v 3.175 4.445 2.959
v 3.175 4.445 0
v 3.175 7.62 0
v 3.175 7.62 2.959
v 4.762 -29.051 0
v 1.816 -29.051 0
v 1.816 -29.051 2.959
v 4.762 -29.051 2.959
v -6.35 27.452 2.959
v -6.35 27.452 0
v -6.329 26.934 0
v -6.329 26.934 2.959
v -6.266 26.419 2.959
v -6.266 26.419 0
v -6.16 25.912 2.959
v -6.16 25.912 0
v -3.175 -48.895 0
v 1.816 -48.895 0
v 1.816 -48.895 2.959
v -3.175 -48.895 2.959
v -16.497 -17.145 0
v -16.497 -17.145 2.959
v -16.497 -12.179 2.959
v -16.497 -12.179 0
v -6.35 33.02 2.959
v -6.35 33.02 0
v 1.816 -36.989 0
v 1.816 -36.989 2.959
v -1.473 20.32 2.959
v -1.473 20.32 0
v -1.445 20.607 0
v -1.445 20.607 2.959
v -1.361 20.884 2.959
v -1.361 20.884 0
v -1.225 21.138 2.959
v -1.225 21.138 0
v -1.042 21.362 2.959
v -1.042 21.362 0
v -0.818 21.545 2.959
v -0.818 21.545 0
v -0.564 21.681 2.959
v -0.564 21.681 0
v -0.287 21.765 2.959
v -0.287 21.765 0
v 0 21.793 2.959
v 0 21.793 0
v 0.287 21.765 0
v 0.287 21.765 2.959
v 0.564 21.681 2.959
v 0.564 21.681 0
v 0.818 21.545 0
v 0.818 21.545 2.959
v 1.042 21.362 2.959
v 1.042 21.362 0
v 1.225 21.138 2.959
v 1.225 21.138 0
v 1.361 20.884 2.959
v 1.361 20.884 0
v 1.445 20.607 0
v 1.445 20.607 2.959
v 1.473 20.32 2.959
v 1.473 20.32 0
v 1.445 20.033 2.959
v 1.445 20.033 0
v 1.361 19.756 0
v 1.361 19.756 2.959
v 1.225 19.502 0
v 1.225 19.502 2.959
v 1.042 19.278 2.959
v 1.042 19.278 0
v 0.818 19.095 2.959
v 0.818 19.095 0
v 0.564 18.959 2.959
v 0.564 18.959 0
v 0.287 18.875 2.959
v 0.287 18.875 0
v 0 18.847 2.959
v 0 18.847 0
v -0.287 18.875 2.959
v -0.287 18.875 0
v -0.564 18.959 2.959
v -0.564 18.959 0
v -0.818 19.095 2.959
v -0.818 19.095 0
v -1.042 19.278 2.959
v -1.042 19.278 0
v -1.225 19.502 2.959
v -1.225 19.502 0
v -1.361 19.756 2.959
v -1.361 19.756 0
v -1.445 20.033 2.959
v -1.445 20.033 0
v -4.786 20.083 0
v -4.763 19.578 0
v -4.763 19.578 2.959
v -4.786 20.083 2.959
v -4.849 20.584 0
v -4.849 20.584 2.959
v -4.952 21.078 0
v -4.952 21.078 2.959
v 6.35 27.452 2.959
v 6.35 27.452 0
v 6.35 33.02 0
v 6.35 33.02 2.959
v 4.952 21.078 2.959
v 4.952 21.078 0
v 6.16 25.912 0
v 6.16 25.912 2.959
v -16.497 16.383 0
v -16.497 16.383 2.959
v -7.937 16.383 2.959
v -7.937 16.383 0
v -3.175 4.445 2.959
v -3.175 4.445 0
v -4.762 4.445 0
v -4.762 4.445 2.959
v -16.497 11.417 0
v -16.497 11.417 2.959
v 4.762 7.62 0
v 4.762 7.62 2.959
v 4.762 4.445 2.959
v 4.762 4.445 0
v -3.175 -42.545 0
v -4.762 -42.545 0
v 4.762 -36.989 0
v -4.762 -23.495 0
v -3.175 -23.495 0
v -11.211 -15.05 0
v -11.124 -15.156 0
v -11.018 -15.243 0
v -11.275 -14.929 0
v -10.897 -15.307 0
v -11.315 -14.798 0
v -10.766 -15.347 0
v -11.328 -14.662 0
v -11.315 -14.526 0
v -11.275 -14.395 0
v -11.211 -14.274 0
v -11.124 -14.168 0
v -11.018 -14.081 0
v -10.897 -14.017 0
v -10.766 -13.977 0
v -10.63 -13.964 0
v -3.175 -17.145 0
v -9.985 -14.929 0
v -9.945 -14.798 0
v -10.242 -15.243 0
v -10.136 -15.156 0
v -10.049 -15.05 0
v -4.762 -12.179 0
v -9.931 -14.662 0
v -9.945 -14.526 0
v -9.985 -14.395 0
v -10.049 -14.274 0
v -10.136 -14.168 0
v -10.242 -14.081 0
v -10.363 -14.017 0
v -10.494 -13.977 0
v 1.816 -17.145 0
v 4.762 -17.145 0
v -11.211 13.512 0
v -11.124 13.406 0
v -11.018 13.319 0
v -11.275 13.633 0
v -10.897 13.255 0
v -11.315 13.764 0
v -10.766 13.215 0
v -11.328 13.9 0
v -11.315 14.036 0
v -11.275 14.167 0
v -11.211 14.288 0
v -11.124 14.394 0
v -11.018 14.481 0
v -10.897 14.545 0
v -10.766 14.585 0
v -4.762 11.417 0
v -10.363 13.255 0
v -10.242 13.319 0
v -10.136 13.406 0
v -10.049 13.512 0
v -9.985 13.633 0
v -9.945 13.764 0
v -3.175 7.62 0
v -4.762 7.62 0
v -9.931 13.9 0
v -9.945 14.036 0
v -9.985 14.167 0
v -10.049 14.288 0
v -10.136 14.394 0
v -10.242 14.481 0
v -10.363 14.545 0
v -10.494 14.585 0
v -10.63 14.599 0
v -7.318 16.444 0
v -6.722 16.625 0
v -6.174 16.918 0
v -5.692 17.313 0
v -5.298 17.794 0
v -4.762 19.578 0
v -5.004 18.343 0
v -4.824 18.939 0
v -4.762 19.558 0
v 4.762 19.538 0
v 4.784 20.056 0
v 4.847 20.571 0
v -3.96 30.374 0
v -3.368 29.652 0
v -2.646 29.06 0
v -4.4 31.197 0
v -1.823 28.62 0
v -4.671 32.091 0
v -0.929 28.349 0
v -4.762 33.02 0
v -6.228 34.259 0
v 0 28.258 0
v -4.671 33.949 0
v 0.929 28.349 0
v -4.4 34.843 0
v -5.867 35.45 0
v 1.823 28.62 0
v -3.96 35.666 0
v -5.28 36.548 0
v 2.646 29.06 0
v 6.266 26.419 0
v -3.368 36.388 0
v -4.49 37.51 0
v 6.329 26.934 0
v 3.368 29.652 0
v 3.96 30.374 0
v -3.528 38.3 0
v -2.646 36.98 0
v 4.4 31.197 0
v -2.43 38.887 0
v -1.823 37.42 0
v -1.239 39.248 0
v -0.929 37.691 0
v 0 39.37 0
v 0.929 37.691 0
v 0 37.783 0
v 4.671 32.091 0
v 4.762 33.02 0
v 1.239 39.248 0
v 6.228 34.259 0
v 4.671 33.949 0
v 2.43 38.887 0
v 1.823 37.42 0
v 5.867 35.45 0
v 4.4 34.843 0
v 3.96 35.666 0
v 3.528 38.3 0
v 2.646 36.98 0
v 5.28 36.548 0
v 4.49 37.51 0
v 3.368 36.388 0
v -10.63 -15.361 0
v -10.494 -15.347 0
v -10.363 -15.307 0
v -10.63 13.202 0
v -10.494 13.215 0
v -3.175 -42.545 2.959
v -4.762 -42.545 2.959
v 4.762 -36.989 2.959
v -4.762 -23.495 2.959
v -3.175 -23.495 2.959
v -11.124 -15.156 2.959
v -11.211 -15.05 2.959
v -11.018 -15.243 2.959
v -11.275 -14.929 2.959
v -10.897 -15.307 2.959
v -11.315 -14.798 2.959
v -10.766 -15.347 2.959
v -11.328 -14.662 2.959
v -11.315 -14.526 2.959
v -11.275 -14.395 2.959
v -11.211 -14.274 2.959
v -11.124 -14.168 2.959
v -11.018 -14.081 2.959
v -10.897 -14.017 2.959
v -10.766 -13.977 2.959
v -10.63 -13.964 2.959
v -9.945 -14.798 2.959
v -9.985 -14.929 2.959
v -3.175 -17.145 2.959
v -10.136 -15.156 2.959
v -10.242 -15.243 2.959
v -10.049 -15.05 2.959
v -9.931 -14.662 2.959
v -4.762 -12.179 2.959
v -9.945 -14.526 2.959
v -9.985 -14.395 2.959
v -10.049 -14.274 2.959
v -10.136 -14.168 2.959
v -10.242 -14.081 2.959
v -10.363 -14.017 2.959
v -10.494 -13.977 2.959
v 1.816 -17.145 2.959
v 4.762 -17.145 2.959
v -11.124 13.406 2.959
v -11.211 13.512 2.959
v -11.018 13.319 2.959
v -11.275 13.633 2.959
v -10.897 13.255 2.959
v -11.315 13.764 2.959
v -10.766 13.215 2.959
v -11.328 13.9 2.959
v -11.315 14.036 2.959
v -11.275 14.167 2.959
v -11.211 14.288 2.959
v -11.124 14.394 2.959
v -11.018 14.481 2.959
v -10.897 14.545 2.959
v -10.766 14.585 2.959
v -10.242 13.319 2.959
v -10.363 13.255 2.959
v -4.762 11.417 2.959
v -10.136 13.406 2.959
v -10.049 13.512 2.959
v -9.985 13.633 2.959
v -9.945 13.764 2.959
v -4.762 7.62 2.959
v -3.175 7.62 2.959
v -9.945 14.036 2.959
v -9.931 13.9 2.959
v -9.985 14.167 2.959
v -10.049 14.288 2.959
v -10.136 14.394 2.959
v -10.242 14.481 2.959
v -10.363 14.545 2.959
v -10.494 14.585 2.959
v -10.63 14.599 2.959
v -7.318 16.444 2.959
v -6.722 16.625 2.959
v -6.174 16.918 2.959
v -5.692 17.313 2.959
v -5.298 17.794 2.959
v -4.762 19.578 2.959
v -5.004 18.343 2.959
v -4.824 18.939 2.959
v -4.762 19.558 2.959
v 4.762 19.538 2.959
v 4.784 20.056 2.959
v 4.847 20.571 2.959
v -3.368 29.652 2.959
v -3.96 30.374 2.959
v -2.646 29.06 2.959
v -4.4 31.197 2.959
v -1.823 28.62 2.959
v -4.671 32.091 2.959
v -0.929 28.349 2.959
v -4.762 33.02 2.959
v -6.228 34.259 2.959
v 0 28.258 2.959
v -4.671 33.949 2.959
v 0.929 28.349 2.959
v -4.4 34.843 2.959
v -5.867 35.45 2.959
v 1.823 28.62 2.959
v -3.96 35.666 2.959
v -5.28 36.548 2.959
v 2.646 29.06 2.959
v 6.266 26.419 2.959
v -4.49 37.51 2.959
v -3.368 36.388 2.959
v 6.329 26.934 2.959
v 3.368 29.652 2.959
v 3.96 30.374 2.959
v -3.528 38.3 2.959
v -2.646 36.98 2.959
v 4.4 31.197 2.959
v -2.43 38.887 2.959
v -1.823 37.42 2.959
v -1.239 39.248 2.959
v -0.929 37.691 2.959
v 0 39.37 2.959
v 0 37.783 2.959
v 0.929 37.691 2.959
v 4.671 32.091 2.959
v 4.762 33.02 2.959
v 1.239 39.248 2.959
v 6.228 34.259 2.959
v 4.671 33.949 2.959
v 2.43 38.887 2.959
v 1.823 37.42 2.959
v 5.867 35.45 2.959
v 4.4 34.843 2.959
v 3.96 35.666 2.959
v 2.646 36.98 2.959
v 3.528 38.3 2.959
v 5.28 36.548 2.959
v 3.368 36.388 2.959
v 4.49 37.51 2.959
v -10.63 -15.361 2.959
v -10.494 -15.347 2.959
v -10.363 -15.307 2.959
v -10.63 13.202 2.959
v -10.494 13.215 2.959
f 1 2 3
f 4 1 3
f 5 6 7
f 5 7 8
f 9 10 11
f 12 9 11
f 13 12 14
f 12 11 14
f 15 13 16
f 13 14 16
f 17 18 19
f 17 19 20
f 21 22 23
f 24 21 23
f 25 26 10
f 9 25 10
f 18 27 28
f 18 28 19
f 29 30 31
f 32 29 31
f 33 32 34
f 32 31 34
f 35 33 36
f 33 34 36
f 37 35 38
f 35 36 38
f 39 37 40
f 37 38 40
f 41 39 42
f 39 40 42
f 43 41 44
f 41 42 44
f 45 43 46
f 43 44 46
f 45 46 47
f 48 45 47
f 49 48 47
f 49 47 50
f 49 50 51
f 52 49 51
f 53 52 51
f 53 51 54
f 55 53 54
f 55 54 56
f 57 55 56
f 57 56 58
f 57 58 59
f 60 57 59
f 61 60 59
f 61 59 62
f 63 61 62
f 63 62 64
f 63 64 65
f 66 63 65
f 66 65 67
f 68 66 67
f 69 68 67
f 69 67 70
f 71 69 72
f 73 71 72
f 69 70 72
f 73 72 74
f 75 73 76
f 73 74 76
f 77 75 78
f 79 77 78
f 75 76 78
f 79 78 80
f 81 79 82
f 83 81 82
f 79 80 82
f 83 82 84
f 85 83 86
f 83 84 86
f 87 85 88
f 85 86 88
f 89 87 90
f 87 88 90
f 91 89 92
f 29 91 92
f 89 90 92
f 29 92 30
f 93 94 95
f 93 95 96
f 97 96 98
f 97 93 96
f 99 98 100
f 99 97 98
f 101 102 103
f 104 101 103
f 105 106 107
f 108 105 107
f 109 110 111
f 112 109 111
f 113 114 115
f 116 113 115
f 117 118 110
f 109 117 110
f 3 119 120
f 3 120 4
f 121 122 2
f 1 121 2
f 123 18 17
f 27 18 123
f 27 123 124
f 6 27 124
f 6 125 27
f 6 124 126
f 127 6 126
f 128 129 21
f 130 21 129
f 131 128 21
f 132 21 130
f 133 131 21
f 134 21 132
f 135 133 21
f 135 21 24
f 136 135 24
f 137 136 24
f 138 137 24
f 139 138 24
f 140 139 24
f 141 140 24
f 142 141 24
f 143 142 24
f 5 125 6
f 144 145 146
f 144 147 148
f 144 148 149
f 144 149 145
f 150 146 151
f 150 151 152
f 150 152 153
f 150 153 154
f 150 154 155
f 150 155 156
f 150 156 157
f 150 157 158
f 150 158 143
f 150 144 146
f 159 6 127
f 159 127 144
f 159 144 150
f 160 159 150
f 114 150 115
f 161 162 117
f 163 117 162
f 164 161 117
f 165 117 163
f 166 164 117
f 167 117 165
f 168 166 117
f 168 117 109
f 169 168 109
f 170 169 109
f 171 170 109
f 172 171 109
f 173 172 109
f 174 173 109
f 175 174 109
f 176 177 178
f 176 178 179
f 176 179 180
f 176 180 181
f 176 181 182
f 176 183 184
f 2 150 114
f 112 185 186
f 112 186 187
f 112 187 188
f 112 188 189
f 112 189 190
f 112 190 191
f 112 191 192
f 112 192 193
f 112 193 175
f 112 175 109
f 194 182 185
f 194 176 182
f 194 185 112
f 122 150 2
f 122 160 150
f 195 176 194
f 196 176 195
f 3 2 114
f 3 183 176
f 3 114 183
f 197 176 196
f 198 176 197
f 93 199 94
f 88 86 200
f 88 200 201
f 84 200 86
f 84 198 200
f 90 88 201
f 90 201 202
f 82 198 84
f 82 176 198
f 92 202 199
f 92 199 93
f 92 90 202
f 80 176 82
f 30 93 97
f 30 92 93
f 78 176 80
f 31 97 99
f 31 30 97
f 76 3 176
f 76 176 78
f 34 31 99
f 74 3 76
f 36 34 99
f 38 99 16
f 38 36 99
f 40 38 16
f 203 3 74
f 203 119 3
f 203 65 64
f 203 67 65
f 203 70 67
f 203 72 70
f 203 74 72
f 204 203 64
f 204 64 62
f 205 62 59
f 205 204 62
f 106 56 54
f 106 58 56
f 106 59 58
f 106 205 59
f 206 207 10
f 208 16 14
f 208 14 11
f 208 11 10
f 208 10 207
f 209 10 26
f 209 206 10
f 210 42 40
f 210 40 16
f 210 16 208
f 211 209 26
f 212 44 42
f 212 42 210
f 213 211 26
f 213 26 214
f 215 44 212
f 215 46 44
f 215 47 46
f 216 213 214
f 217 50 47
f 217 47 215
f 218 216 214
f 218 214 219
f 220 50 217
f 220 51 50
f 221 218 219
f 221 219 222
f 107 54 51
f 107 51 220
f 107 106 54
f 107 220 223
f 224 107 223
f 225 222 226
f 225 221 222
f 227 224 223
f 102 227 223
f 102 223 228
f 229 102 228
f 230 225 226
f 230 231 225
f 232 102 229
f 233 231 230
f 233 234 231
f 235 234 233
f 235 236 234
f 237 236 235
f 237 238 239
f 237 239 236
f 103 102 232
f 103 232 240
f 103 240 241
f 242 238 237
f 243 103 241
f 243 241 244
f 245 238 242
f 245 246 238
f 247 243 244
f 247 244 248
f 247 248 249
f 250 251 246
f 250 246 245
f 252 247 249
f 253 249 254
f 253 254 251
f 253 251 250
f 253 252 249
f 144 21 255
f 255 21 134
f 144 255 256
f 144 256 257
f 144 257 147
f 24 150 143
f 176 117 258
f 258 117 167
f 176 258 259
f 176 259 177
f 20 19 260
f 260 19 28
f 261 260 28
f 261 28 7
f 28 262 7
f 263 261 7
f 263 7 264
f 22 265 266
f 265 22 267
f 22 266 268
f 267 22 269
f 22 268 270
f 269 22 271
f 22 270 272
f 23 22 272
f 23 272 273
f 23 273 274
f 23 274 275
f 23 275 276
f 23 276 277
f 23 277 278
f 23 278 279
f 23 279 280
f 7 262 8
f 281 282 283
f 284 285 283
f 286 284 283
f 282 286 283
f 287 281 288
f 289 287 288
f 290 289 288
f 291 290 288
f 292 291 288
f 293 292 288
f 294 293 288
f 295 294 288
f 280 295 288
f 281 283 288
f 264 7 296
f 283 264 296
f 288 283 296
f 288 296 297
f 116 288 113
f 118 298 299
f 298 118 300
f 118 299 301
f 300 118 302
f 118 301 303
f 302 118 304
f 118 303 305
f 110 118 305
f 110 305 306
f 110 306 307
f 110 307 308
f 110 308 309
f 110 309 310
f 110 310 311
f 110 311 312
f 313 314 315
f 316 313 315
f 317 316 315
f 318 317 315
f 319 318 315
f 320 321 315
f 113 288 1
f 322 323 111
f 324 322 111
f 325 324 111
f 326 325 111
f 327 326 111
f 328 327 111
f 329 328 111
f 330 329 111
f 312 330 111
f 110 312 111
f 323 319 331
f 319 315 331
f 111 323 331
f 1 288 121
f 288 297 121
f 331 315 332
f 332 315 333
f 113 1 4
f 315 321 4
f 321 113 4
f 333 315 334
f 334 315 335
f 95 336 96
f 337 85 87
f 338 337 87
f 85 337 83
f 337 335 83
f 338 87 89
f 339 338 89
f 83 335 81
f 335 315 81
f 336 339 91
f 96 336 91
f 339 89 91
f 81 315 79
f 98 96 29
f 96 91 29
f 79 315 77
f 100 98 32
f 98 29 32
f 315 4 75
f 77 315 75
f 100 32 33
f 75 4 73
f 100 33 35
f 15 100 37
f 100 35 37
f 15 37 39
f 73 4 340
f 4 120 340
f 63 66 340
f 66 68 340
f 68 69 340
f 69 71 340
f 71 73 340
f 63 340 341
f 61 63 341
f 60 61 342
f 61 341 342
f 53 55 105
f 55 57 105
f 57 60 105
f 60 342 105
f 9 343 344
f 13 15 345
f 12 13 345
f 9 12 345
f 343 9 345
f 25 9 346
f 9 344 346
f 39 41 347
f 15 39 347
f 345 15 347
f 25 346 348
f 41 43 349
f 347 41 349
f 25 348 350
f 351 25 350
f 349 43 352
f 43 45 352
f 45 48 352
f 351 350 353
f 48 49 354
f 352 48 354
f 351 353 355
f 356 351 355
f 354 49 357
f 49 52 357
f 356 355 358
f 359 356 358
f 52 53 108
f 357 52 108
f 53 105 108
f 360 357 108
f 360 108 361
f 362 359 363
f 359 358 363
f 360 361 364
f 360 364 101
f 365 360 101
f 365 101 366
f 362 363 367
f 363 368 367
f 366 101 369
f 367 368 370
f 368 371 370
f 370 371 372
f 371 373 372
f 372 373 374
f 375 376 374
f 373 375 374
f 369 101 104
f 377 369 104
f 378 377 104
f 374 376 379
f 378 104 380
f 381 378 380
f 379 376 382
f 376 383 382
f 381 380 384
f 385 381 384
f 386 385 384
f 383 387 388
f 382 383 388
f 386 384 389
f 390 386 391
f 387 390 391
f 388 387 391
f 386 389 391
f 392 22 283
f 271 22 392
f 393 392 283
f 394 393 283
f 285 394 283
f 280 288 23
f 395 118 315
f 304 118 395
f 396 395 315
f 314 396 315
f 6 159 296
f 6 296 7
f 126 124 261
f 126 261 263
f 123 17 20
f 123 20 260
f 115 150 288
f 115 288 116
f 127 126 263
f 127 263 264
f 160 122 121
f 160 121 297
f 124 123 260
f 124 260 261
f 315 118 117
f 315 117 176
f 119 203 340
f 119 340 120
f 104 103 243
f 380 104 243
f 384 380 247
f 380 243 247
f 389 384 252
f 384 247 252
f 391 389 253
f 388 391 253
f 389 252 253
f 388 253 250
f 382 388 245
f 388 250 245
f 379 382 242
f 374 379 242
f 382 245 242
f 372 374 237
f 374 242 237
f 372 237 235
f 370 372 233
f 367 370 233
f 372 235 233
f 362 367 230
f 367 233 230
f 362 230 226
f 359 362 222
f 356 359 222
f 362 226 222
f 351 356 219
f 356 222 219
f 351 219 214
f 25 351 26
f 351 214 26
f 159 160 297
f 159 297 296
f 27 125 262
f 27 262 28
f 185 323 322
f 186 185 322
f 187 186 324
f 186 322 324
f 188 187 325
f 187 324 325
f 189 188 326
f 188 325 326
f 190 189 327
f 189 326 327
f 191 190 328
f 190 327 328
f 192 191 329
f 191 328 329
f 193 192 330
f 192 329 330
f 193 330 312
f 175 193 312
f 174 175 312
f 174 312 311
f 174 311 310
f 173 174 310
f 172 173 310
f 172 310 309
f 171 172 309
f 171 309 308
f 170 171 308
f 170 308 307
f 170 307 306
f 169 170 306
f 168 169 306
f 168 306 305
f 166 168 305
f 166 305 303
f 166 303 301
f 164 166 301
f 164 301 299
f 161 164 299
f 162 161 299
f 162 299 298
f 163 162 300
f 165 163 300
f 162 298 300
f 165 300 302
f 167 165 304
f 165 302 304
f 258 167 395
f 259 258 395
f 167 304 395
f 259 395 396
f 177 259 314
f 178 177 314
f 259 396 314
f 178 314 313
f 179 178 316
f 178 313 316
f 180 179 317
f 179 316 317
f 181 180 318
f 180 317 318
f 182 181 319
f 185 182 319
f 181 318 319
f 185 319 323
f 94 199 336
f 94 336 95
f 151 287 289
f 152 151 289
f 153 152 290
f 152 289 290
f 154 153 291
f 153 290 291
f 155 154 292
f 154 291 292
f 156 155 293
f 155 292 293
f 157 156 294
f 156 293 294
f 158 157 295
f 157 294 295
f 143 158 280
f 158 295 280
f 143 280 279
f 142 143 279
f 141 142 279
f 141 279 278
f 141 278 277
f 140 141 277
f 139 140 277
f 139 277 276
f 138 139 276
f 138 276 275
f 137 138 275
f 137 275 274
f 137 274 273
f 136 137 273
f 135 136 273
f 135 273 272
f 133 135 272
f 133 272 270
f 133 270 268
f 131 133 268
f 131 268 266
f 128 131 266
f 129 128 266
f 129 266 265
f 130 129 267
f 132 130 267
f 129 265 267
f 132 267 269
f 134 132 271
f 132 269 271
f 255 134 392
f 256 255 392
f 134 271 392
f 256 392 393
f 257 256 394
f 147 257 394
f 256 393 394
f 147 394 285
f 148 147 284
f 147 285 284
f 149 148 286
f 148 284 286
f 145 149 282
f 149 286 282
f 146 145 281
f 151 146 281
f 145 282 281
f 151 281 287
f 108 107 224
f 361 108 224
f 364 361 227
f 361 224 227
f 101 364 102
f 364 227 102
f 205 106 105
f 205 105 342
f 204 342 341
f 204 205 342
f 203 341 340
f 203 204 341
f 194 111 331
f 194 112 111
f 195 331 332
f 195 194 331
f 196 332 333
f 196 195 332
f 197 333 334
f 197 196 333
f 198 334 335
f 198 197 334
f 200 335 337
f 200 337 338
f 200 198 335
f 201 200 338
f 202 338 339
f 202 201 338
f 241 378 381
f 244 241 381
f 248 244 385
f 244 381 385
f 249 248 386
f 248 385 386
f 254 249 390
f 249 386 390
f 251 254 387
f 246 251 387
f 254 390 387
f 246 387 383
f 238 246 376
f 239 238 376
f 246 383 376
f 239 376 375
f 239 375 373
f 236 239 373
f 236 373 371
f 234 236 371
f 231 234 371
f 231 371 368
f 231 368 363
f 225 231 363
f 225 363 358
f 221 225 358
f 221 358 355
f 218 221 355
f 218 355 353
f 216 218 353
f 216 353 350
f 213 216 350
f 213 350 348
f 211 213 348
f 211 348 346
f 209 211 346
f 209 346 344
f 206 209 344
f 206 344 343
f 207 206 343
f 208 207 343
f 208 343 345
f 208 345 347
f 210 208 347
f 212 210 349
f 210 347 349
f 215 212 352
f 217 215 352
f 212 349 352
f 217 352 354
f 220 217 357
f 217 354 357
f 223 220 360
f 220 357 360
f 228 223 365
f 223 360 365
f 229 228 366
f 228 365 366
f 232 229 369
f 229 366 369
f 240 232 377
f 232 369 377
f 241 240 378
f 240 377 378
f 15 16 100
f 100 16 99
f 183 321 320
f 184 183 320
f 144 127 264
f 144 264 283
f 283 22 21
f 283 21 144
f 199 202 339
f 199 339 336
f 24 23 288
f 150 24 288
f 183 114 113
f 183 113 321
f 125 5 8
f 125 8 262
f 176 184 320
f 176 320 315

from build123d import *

# Parameters (mm, degrees)
SKETCH1_R             = 3.175
BOSS_EXTRUDE1_DEPTH   = 2.9591
SKETCH8_W             = 1.5875
SKETCH8_H             = 3.175
CUT_EXTRUDE4_DEPTH    = 50.215431564
SKETCH4_W             = 11.7348
SKETCH4_H             = 4.9657
BOSS_EXTRUDE2_DEPTH   = 2.9591
FILLET1_R             = 3.175
F_0_CLEARANCE_HOLE1_D = 1.397
F_4_CLEARANCE_HOLE1_D = 2.9464
BOSS_EXTRUDE3_START   = -2.9591
BOSS_EXTRUDE3_DEPTH   = 2.9591
FILLET2_R             = 6.35
CUT_EXTRUDE5_REACH    = 53.688
SKETCH12_R            = 4.7625


with BuildPart() as part:
    # Sketch1 → Boss-Extrude1 (new body)
    with BuildSketch(Plane.XY):
        with BuildLine():
            Line((4.7625, 33.02), (4.7625, -17.145))
            Line((4.7625, -17.145), (1.8161, -17.145))
            Line((1.8161, -17.145), (1.8161, -29.05125))
            Line((1.8161, -29.05125), (4.7625, -29.05125))
            Line((4.7625, -29.05125), (4.7625, -36.98875))
            Line((4.7625, -36.98875), (1.8161, -36.98875))
            Line((1.8161, -36.98875), (1.8161, -48.895))
            Line((1.8161, -48.895), (-3.175, -48.895))
            Line((-3.175, -48.895), (-3.175, -42.545))
            Line((-3.175, -42.545), (-4.7625, -42.545))
            Line((-4.7625, -42.545), (-4.7625, -23.495))
            Line((-4.7625, -23.495), (-3.175, -23.495))
            Line((-3.175, -23.495), (-3.175, -17.145))
            Line((-3.175, -17.145), (-4.7625, -17.145))
            Line((-4.7625, -17.145), (-4.7625, 33.02))
            ThreePointArc((-4.7625, 33.02), (0, 37.7825), (4.7625, 33.02))
        make_face()
        with Locations((0, 33.02)):
            Circle(SKETCH1_R, mode=Mode.SUBTRACT)
    extrude(amount=BOSS_EXTRUDE1_DEPTH)

    # Sketch8 → Cut-Extrude4 (cut, through all)
    with BuildSketch(Plane(origin=(0, 0, 0), x_dir=(-1, 0, 0), z_dir=(0, 0, -1))):
        with Locations((-3.96875, 6.0325)):
            Rectangle(SKETCH8_W, SKETCH8_H)
        with Locations((3.96875, 6.0325)):
            Rectangle(SKETCH8_W, SKETCH8_H)
    extrude(amount=-CUT_EXTRUDE4_DEPTH, mode=Mode.SUBTRACT)

    # Sketch4 → Boss-Extrude2 (add)
    with BuildSketch(Plane.XY.offset(2.9591)):
        with Locations((-10.6299, 13.90015)):
            Rectangle(SKETCH4_W, SKETCH4_H)
        with Locations((-10.6299, -14.66215)):
            Rectangle(SKETCH4_W, SKETCH4_H)
    extrude(amount=-BOSS_EXTRUDE2_DEPTH)

    # Fillet1
    fillet1_edges = [part.edges().sort_by_distance(p)[0] for p in [
        (-4.7625, 16.383, 1.47955),
    ]]
    fillet(fillet1_edges, radius=FILLET1_R)

    # #0 Clearance Hole1 (through all)
    with Locations(Plane(origin=(0, 0, 0), x_dir=(-1, 0, 0), z_dir=(0, 0, -1))):
        with Locations((10.6299, 13.90015), (10.6299, -14.66215)):
            Hole(F_0_CLEARANCE_HOLE1_D / 2)

    # #4 Clearance Hole1 (through all)
    with Locations(Plane.XY.offset(2.9591)):
        with Locations((0, 20.32)):
            Hole(F_4_CLEARANCE_HOLE1_D / 2)

    # Sketch11 → Boss-Extrude3 (add)
    with BuildSketch(Plane.XY.offset(2.9591).offset(BOSS_EXTRUDE3_START)):
        with BuildLine():
            Line((-6.35, 33.02), (-6.35, 26.67))
            Line((-6.35, 26.67), (-4.7625, 20.32))
            Line((-4.7625, 20.32), (-4.7625, 33.02))
            ThreePointArc((-4.7625, 33.02), (0, 37.7825), (4.7625, 33.02))
            Line((4.7625, 33.02), (4.7625, 20.32))
            Line((4.7625, 20.32), (6.35, 26.67))
            Line((6.35, 26.67), (6.35, 33.02))
            ThreePointArc((6.35, 33.02), (0, 39.37), (-6.35, 33.02))
        make_face()
    extrude(amount=BOSS_EXTRUDE3_DEPTH)

    # Fillet2
    # the kernel refuses this fillet: 6.35 mm, written as the material it adds along each edge
    with BuildSketch(Plane(origin=(4.7625, 20.32, 0), x_dir=(0, -1, 0), z_dir=(0, 0, 1))) as fillet2_piece_1:
        with BuildLine():
            CenterArc((FILLET2_R * 0.123105625618, FILLET2_R), FILLET2_R, 255.963756532, 14.036243468)
            Line((-FILLET2_R * 0.119429999419, FILLET2_R * 0.0298574998547), (0, 0))
            Line((0, 0), (FILLET2_R * 0.123105625618, 0))
        make_face()
    extrude(amount=2.9591)
    with BuildSketch(Plane(origin=(-4.7625, 20.32, 0), x_dir=(-8.465505129601726e-05, -0.9999999964167612, 0), z_dir=(0, 0, 1))) as fillet2_piece_2_section:
        with BuildLine():
            CenterArc((0.78250954, -6.349870963), FILLET2_R, 90.365265554, 13.675828291)
            Line((-0.758113183, -0.189596486), (-0.912175455, 0.426430961))
            Line((-0.912175455, 0.426430961), (-0.154062272, 0.616027448))
            Line((-0.154062272, 0.616027448), (-5.3756e-05, 0.634999998))
            ThreePointArc((-5.3756e-05, 0.634999998), (0.761946241, 0.635064505), (0.737979862, 0.634987096))
            Line((0.737979862, 0.634987096), (0.742028014, 0))
        make_face()
    fillet2_piece_2 = extrude(amount=2.9591, mode=Mode.PRIVATE)
    fillet2_piece_2 = split(fillet2_piece_2, bisect_by=Plane(origin=(-4.799885723, 7.62, 1.47955), z_dir=(0, 1, 0)), keep=Keep.TOP, mode=Mode.PRIVATE)
    fillet2_piece_2 = split(fillet2_piece_2, bisect_by=Plane(origin=(-3.175, 20.335301711, 1.47955), z_dir=(-1, 0, 0)), keep=Keep.TOP, mode=Mode.PRIVATE)
    add(fillet2_piece_2)
    # the kernel refuses this fillet: 6.35 mm, written as the material it takes off along each edge
    with BuildSketch(Plane(origin=(6.35, 26.67, -1.954301807), x_dir=(0, 1, 0), z_dir=(0, 0, 1))) as fillet2_2_piece_1:
        with BuildLine():
            CenterArc((FILLET2_R * 0.123105625618, FILLET2_R), FILLET2_R, 255.963756532, 14.036243468)
            Line((-FILLET2_R * 0.119429999419, FILLET2_R * 0.0298574998547), (0, 0))
            Line((0, 0), (FILLET2_R * 0.123105625618, 0))
        make_face()
    extrude(amount=6.867703613, mode=Mode.SUBTRACT)
    with BuildSketch(Plane(origin=(-6.35, 26.67, -1.954301807), x_dir=(0, 1, 0), z_dir=(0, 0, 1))) as fillet2_2_piece_2:
        with BuildLine():
            CenterArc((FILLET2_R * 0.123105625618, -FILLET2_R), FILLET2_R, 90, 14.036243468)
            Line((-FILLET2_R * 0.119429999419, -FILLET2_R * 0.0298574998547), (0, 0))
            Line((0, 0), (FILLET2_R * 0.123105625618, 0))
        make_face()
    extrude(amount=6.867703613, mode=Mode.SUBTRACT)

    # Sketch12 → Cut-Extrude5 (cut, up to next)
    with BuildSketch(Plane.XY.offset(2.9591), mode=Mode.PRIVATE) as cut_extrude5_sk1:
        with Locations((0, 33.02)):
            Circle(SKETCH12_R)
    cut_extrude5_tool1 = extrude(cut_extrude5_sk1.sketch, amount=-CUT_EXTRUDE5_REACH, mode=Mode.PRIVATE) & part.part
    add(cut_extrude5_tool1.solids().sort_by_distance((0, 33.02, 2.9591))[0], mode=Mode.SUBTRACT)


solid = part.part
